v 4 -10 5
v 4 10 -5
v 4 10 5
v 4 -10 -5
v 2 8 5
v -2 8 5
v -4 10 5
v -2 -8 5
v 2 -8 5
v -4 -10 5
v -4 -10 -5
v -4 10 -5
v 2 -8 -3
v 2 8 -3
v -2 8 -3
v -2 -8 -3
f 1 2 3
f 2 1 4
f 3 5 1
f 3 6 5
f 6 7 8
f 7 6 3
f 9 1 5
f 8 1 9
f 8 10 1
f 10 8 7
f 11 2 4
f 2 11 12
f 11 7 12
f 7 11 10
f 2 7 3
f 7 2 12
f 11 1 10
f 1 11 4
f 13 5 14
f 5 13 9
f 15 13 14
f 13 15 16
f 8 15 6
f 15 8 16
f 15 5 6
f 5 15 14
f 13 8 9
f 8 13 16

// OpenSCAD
difference(){
    cube([8,20,10],center=true);
    translate([0,0,2]){
        cube([4,16,10],center=true);
    }
}
